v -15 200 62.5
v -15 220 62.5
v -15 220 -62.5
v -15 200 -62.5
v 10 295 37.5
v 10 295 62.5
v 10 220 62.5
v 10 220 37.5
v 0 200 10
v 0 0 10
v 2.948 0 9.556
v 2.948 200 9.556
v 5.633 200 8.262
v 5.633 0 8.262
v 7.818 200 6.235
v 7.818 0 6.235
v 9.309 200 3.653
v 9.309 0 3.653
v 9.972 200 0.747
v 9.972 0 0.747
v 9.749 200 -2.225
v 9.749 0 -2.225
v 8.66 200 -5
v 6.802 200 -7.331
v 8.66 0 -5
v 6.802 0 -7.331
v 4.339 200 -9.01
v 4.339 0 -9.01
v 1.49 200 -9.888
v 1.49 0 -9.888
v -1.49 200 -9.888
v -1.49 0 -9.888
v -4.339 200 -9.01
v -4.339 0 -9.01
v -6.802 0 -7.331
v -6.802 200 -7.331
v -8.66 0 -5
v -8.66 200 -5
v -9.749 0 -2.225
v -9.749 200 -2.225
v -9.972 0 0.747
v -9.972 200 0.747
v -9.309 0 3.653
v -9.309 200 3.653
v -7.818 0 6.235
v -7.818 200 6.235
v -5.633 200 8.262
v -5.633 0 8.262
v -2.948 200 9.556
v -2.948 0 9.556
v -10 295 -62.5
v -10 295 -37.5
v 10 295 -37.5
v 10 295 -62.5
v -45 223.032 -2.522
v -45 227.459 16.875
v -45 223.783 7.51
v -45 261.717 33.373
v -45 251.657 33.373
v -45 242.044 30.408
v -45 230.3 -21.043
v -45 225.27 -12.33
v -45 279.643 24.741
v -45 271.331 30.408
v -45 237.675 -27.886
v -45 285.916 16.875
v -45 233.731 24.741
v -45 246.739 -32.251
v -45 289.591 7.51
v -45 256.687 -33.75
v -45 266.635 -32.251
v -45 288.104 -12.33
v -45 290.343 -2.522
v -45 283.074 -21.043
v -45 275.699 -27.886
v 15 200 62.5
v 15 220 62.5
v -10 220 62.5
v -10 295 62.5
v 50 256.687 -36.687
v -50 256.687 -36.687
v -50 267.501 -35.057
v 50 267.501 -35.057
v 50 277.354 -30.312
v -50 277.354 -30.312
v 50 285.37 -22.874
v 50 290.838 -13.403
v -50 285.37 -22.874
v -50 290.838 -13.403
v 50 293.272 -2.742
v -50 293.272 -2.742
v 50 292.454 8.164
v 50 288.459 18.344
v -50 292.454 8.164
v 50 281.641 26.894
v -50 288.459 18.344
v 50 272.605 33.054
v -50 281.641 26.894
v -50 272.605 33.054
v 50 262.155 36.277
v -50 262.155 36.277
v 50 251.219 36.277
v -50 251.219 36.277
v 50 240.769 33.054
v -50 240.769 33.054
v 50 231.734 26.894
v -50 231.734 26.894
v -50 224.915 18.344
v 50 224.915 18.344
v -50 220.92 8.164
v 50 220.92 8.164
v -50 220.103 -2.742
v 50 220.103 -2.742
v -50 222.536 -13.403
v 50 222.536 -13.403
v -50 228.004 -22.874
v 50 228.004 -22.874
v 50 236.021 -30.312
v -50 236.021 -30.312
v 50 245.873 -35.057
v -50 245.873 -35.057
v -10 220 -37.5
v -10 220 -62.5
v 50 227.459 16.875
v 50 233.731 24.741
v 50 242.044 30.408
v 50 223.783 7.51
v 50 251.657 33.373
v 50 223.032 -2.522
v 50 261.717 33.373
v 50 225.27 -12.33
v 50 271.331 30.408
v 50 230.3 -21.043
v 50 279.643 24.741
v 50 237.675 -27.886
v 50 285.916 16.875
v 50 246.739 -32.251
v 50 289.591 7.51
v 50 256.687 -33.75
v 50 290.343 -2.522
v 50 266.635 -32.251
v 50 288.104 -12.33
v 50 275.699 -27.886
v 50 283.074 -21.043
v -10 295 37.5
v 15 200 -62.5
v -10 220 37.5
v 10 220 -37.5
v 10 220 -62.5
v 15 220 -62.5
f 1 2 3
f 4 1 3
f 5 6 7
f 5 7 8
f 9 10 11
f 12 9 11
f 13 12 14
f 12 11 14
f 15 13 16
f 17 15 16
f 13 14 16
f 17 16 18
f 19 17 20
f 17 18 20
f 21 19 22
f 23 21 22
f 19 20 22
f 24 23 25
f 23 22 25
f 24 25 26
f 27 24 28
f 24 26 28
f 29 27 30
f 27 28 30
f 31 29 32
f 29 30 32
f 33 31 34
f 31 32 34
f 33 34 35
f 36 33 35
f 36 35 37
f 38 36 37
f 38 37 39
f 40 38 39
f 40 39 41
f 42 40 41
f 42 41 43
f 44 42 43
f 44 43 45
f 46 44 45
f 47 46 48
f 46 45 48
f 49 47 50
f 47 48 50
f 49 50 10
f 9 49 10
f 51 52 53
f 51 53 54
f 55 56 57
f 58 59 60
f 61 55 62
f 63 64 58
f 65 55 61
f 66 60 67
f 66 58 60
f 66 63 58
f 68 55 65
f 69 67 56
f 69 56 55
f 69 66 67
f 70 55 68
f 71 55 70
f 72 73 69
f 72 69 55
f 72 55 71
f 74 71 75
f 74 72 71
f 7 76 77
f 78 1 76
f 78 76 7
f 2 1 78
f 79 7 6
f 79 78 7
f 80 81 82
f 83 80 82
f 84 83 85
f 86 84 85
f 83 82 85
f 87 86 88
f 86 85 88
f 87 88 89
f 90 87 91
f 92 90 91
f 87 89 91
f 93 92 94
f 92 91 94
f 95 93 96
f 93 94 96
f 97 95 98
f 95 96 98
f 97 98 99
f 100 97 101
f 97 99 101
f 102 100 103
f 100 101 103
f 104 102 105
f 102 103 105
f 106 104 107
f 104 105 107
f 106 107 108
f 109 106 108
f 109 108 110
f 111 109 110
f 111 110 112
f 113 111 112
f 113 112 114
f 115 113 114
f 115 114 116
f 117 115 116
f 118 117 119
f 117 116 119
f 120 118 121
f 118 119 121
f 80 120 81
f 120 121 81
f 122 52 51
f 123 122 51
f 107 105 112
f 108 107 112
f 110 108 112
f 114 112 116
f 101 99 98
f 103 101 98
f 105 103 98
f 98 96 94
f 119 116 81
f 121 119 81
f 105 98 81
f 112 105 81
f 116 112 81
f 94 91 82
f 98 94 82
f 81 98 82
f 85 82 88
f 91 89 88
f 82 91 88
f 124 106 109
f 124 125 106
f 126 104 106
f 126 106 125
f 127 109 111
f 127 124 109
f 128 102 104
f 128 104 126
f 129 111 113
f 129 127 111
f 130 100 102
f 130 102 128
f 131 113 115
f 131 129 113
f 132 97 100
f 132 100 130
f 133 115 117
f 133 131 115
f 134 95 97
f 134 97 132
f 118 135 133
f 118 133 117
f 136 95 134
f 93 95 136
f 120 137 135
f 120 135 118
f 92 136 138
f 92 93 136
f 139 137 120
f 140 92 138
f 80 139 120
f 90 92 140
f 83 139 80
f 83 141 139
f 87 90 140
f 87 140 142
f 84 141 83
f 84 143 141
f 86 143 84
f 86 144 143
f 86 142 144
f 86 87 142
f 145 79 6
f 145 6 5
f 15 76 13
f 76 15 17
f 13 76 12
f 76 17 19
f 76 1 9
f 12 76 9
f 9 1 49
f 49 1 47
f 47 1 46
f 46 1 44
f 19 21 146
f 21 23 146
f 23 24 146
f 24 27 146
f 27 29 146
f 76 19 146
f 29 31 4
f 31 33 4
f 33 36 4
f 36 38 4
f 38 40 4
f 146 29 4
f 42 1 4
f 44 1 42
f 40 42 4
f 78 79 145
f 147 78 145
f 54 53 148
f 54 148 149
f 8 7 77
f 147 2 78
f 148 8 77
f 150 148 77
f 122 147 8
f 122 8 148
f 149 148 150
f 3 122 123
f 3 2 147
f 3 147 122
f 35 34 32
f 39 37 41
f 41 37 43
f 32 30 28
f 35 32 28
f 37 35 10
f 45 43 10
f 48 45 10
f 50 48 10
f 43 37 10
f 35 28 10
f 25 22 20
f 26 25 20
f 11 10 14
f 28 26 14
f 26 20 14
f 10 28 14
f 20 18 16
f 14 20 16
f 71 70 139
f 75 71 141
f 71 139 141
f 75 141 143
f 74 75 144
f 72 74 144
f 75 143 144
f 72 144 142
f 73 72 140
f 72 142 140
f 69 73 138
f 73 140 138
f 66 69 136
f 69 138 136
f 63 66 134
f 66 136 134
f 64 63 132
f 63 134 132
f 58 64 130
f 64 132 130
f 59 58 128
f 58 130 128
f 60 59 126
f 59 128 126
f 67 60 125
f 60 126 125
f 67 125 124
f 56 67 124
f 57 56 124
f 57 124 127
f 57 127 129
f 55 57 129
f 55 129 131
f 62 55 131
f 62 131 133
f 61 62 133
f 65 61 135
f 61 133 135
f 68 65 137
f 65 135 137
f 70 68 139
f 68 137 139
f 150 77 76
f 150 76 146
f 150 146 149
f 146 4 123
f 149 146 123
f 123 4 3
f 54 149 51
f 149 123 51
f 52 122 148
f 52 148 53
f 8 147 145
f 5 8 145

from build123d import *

# Parameters (mm, degrees)
SKETCH1_R                = 10
BOSS_EXTRUDE1_DEPTH      = 200
BOSS_EXTRUDE2_DEPTH      = 15
BOSS_EXTRUDE2_DEPTH_BACK = 15
SKETCH2_W                = 125
SKETCH2_H                = 20
BOSS_EXTRUDE3_DEPTH      = 10
BOSS_EXTRUDE3_DEPTH_BACK = 10
SKETCH3_W                = 25
SKETCH3_H                = 75
BOSS_EXTRUDE4_DEPTH      = 50
BOSS_EXTRUDE4_DEPTH_BACK = 50
SKETCH4_R                = 36.687155129
SKETCH5_R                = 33.75
CUT_EXTRUDE2_DEPTH       = 95


with BuildPart() as part:
    # Sketch1 → Boss-Extrude1 (new body)
    with BuildSketch(Plane(origin=(0, 0, 0), x_dir=(1, 0, 0), z_dir=(0, 1, 0))):
        Circle(SKETCH1_R)
    extrude(amount=BOSS_EXTRUDE1_DEPTH)

    # Sketch2 → Boss-Extrude2 (add, two sides: drawn at the far end of the back side and taken through both)
    with BuildSketch(Plane(origin=(0, 0, 0), x_dir=(0, 0, -1), z_dir=(1, 0, 0)).offset(-BOSS_EXTRUDE2_DEPTH_BACK)):
        with Locations((0, 210)):
            Rectangle(SKETCH2_W, SKETCH2_H)
    extrude(amount=BOSS_EXTRUDE2_DEPTH + BOSS_EXTRUDE2_DEPTH_BACK)

    # Sketch3 → Boss-Extrude3 (add, two sides: drawn at the far end of the back side and taken through both)
    with BuildSketch(Plane(origin=(0, 0, 0), x_dir=(0, 0, -1), z_dir=(1, 0, 0)).offset(-BOSS_EXTRUDE3_DEPTH_BACK)):
        with Locations((-50, 257.5)):
            Rectangle(SKETCH3_W, SKETCH3_H)
        with Locations((50, 257.5)):
            Rectangle(SKETCH3_W, SKETCH3_H)
    extrude(amount=BOSS_EXTRUDE3_DEPTH + BOSS_EXTRUDE3_DEPTH_BACK)


with BuildPart() as body_2:
    # Sketch4 → Boss-Extrude4 (new, two sides: drawn at the far end of the back side and taken through both)
    with BuildSketch(Plane(origin=(0, 0, 0), x_dir=(0, 0, -1), z_dir=(1, 0, 0)).offset(-BOSS_EXTRUDE4_DEPTH_BACK)):
        with Locations((0, 256.687155129)):
            Circle(SKETCH4_R)
    extrude(amount=BOSS_EXTRUDE4_DEPTH + BOSS_EXTRUDE4_DEPTH_BACK)

    # Sketch5 → Cut-Extrude2 (cut)
    with BuildSketch(Plane(origin=(50, 0, 0), x_dir=(0, 0, -1), z_dir=(1, 0, 0))):
        with Locations((0, 256.687155129)):
            Circle(SKETCH5_R)
    extrude(amount=-CUT_EXTRUDE2_DEPTH, mode=Mode.SUBTRACT)


solid = Compound([part.part, body_2.part])
